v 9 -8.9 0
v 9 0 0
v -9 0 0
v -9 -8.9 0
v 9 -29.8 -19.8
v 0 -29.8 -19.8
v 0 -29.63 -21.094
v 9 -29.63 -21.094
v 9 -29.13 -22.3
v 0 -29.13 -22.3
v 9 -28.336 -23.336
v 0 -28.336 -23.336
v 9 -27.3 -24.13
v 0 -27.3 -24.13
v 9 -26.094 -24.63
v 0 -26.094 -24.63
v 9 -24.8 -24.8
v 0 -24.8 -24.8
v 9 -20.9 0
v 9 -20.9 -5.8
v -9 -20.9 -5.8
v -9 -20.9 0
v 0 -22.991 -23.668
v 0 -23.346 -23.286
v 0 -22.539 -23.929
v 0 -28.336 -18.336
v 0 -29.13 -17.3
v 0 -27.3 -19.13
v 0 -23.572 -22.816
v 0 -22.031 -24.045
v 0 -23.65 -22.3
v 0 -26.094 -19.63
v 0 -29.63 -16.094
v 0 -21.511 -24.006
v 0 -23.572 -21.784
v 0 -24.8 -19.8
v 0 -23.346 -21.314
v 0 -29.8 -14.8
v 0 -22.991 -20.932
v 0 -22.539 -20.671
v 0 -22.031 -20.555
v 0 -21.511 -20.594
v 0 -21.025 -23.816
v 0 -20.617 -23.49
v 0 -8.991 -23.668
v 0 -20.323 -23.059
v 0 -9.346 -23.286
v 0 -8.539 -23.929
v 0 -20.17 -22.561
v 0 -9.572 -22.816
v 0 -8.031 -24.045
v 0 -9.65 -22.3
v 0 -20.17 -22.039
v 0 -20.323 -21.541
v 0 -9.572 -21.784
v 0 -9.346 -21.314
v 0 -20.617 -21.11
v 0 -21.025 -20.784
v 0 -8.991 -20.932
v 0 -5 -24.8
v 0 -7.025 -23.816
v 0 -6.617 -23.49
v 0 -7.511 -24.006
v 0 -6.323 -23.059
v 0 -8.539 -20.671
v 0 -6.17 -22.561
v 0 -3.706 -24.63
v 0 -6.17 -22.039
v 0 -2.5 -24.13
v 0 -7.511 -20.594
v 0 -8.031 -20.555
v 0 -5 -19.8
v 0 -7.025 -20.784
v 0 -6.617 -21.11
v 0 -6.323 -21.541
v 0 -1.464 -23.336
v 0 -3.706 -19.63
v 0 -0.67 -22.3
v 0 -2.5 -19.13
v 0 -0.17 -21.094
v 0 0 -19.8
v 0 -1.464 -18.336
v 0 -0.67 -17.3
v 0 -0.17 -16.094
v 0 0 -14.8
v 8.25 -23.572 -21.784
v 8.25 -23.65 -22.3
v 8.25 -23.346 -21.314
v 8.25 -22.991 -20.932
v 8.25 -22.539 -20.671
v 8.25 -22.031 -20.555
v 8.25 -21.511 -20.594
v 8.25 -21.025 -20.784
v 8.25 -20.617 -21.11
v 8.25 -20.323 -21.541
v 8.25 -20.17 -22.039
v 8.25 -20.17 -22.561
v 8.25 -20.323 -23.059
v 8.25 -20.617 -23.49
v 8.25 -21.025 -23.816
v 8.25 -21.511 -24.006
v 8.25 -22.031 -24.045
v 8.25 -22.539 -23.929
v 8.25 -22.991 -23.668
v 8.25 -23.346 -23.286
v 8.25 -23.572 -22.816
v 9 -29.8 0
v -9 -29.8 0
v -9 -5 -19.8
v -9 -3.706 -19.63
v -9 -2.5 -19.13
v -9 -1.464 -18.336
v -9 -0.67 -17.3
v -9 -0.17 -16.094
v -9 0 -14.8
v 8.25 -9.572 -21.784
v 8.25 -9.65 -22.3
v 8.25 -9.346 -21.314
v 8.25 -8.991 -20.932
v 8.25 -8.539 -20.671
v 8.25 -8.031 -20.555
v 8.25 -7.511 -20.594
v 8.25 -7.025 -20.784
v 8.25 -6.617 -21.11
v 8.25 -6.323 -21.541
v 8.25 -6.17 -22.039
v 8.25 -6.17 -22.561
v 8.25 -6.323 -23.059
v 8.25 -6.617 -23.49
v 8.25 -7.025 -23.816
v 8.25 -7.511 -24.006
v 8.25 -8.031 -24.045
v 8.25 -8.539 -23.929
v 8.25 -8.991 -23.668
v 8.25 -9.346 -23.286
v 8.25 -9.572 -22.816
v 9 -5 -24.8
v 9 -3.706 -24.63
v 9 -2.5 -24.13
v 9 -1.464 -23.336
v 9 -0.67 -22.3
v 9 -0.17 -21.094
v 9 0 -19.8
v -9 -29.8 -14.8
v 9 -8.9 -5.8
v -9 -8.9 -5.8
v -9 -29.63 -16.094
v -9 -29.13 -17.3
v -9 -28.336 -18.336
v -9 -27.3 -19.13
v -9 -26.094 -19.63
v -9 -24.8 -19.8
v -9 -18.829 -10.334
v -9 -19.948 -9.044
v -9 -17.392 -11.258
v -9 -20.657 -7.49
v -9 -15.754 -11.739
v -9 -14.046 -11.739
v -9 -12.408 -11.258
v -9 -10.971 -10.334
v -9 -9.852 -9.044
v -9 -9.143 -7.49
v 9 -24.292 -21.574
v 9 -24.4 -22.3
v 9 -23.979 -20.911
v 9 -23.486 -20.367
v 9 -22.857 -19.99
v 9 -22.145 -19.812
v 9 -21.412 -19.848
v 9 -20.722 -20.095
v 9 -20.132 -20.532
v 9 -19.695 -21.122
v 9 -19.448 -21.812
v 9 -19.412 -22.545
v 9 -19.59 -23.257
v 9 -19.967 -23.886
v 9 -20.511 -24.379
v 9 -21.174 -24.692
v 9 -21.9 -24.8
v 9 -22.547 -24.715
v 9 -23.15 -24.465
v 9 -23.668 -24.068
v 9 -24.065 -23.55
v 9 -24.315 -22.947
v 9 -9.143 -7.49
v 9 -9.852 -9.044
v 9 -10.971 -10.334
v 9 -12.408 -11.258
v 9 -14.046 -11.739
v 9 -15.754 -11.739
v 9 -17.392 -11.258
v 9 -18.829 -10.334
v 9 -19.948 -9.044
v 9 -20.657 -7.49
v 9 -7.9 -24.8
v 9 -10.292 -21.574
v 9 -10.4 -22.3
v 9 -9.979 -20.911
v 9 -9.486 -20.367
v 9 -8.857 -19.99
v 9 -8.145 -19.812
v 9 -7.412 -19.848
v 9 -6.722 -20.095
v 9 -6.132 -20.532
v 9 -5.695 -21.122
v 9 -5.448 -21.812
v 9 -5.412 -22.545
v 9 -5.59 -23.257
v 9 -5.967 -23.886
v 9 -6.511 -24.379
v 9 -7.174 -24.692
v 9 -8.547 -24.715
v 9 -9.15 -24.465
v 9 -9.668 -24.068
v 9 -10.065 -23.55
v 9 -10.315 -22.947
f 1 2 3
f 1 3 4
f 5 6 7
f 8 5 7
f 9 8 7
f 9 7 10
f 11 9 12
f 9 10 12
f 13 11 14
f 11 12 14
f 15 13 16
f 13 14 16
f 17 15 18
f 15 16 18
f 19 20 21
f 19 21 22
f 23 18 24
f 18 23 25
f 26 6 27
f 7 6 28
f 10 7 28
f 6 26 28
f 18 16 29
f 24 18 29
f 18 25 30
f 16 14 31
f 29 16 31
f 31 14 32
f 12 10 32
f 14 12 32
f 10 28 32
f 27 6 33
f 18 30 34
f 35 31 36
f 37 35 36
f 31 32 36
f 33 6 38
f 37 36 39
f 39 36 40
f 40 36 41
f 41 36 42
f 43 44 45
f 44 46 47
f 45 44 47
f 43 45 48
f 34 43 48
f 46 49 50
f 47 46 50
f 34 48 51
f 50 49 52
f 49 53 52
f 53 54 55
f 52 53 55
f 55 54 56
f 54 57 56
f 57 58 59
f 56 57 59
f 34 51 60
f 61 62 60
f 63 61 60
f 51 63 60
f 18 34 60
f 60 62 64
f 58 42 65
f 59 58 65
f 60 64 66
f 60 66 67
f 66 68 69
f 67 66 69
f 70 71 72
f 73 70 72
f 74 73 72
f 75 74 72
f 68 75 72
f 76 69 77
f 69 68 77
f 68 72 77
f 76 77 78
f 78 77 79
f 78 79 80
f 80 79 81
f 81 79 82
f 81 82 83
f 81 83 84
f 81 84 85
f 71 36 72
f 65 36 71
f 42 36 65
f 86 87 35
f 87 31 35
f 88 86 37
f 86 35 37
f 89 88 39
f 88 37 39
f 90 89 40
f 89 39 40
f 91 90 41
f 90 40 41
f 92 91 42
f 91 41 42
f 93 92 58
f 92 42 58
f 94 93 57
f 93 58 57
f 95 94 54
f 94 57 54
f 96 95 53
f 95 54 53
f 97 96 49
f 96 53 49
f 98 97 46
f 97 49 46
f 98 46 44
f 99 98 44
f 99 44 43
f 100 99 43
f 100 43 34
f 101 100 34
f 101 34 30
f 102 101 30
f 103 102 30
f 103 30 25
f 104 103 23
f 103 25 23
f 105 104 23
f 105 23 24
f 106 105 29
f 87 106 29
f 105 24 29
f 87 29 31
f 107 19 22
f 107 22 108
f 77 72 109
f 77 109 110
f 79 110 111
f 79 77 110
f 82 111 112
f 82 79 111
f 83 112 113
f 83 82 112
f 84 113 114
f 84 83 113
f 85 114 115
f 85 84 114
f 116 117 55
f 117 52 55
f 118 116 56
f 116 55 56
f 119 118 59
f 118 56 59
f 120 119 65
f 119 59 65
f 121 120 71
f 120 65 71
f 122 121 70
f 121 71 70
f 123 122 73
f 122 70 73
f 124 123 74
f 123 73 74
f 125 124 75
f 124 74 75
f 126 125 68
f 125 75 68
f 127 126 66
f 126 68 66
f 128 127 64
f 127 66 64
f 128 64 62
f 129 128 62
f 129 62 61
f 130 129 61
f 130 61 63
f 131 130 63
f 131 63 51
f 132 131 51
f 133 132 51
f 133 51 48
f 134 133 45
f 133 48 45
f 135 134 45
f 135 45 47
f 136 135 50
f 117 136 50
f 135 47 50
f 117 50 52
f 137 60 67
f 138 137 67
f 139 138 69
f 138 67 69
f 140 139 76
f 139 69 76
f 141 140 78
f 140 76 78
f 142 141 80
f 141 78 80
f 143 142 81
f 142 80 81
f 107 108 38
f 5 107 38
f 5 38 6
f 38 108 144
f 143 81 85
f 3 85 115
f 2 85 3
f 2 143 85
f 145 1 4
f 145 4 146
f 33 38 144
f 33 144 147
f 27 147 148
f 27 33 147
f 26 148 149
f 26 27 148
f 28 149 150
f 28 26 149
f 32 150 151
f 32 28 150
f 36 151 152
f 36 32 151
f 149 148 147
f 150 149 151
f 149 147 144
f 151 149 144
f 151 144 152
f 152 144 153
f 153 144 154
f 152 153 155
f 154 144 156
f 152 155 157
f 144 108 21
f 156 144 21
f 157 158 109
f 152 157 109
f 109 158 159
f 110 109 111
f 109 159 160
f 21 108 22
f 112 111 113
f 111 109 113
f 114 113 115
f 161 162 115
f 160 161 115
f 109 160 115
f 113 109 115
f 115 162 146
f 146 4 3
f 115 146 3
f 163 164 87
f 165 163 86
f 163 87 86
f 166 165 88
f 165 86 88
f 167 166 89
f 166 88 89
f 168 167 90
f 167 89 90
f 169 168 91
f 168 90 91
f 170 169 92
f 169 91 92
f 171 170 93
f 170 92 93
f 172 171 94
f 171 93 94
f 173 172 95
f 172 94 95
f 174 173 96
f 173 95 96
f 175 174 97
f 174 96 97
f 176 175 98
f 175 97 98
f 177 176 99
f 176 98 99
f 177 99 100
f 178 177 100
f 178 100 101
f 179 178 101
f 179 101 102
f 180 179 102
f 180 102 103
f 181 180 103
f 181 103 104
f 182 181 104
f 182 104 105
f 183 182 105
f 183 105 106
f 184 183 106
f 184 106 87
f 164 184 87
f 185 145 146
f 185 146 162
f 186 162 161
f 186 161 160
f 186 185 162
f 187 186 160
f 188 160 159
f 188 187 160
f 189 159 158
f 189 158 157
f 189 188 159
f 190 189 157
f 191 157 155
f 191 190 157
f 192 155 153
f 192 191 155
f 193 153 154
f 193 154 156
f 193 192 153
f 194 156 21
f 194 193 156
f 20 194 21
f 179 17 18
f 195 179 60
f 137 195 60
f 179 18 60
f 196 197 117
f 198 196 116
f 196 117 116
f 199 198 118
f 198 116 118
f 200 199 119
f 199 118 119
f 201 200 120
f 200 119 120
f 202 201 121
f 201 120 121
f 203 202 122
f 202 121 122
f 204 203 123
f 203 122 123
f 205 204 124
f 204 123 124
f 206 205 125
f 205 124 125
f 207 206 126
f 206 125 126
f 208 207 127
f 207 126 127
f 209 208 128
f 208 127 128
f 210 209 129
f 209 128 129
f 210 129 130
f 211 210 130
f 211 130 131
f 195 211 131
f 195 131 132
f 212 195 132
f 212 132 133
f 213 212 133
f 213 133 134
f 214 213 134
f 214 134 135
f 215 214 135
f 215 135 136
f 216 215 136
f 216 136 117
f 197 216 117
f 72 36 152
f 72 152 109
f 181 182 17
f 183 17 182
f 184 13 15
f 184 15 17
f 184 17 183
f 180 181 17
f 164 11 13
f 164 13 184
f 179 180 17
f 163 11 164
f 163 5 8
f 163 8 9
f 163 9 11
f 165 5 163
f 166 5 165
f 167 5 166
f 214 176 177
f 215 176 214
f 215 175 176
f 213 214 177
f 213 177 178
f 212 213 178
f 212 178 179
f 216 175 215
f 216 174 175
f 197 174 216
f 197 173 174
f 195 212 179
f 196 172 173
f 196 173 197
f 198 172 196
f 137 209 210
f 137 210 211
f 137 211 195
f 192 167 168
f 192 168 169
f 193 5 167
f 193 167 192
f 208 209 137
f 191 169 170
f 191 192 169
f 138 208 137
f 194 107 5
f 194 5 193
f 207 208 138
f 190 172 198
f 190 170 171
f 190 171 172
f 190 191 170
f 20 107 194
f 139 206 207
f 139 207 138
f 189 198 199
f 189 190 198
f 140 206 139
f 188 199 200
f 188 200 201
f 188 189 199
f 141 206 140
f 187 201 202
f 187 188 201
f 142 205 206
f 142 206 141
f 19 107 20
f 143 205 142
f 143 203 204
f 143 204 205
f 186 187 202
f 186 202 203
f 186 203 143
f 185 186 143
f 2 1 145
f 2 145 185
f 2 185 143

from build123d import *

# Parameters (mm, degrees)
F1_DEPTH       = 9
F2_DEPTH       = 9
F4_D           = 3.5
F4_CSINK_D     = 5
F4_CSINK_ANGLE = 90


with BuildPart() as f1:
    # F0 (on Right) → F1 (new body)
    with BuildSketch(Plane.YZ):
        with BuildLine():
            ThreePointArc((-5, -24.8), (-1.464466, -23.335534), (0, -19.8))
            Line((0, -19.8), (0, -14.8))
            ThreePointArc((0, -14.8), (-1.464466, -18.335534), (-5, -19.8))
            Line((-5, -19.8), (-24.8, -19.8))
            ThreePointArc((-24.8, -19.8), (-28.335534, -18.335534), (-29.8, -14.8))
            Line((-29.8, -14.8), (-29.8, -19.8))
            ThreePointArc((-29.8, -19.8), (-28.335534, -23.335534), (-24.8, -24.8))
            Line((-24.8, -24.8), (-5, -24.8))
        make_face()
        with BuildLine():
            ThreePointArc((-5, -19.8), (-1.464466, -18.335534), (0, -14.8))
            Line((0, -14.8), (0, 0))
            Line((0, 0), (-8.9, 0))
            Line((-8.9, 0), (-8.9, -5.8))
            ThreePointArc((-8.9, -5.8), (-14.9, -11.8), (-20.9, -5.8))
            Line((-20.9, -5.8), (-20.9, 0))
            Line((-20.9, 0), (-29.8, 0))
            Line((-29.8, 0), (-29.8, -14.8))
            ThreePointArc((-29.8, -14.8), (-28.335534, -18.335534), (-24.8, -19.8))
            Line((-24.8, -19.8), (-5, -19.8))
        make_face()
    extrude(amount=F1_DEPTH)

    # F0 (on Right) → F2 (join)
    with BuildSketch(Plane.YZ):
        with BuildLine():
            ThreePointArc((-5, -19.8), (-1.464466, -18.335534), (0, -14.8))
            Line((0, -14.8), (0, 0))
            Line((0, 0), (-8.9, 0))
            Line((-8.9, 0), (-8.9, -5.8))
            ThreePointArc((-8.9, -5.8), (-14.9, -11.8), (-20.9, -5.8))
            Line((-20.9, -5.8), (-20.9, 0))
            Line((-20.9, 0), (-29.8, 0))
            Line((-29.8, 0), (-29.8, -14.8))
            ThreePointArc((-29.8, -14.8), (-28.335534, -18.335534), (-24.8, -19.8))
            Line((-24.8, -19.8), (-5, -19.8))
        make_face()
    extrude(amount=-F2_DEPTH)

    # F4 (through all)
    with Locations(Plane.YZ.offset(9)):
        with Locations((-21.9, -22.3), (-7.9, -22.3)):
            CounterSinkHole(F4_D / 2, F4_CSINK_D / 2, counter_sink_angle=F4_CSINK_ANGLE)


solid = f1.part
